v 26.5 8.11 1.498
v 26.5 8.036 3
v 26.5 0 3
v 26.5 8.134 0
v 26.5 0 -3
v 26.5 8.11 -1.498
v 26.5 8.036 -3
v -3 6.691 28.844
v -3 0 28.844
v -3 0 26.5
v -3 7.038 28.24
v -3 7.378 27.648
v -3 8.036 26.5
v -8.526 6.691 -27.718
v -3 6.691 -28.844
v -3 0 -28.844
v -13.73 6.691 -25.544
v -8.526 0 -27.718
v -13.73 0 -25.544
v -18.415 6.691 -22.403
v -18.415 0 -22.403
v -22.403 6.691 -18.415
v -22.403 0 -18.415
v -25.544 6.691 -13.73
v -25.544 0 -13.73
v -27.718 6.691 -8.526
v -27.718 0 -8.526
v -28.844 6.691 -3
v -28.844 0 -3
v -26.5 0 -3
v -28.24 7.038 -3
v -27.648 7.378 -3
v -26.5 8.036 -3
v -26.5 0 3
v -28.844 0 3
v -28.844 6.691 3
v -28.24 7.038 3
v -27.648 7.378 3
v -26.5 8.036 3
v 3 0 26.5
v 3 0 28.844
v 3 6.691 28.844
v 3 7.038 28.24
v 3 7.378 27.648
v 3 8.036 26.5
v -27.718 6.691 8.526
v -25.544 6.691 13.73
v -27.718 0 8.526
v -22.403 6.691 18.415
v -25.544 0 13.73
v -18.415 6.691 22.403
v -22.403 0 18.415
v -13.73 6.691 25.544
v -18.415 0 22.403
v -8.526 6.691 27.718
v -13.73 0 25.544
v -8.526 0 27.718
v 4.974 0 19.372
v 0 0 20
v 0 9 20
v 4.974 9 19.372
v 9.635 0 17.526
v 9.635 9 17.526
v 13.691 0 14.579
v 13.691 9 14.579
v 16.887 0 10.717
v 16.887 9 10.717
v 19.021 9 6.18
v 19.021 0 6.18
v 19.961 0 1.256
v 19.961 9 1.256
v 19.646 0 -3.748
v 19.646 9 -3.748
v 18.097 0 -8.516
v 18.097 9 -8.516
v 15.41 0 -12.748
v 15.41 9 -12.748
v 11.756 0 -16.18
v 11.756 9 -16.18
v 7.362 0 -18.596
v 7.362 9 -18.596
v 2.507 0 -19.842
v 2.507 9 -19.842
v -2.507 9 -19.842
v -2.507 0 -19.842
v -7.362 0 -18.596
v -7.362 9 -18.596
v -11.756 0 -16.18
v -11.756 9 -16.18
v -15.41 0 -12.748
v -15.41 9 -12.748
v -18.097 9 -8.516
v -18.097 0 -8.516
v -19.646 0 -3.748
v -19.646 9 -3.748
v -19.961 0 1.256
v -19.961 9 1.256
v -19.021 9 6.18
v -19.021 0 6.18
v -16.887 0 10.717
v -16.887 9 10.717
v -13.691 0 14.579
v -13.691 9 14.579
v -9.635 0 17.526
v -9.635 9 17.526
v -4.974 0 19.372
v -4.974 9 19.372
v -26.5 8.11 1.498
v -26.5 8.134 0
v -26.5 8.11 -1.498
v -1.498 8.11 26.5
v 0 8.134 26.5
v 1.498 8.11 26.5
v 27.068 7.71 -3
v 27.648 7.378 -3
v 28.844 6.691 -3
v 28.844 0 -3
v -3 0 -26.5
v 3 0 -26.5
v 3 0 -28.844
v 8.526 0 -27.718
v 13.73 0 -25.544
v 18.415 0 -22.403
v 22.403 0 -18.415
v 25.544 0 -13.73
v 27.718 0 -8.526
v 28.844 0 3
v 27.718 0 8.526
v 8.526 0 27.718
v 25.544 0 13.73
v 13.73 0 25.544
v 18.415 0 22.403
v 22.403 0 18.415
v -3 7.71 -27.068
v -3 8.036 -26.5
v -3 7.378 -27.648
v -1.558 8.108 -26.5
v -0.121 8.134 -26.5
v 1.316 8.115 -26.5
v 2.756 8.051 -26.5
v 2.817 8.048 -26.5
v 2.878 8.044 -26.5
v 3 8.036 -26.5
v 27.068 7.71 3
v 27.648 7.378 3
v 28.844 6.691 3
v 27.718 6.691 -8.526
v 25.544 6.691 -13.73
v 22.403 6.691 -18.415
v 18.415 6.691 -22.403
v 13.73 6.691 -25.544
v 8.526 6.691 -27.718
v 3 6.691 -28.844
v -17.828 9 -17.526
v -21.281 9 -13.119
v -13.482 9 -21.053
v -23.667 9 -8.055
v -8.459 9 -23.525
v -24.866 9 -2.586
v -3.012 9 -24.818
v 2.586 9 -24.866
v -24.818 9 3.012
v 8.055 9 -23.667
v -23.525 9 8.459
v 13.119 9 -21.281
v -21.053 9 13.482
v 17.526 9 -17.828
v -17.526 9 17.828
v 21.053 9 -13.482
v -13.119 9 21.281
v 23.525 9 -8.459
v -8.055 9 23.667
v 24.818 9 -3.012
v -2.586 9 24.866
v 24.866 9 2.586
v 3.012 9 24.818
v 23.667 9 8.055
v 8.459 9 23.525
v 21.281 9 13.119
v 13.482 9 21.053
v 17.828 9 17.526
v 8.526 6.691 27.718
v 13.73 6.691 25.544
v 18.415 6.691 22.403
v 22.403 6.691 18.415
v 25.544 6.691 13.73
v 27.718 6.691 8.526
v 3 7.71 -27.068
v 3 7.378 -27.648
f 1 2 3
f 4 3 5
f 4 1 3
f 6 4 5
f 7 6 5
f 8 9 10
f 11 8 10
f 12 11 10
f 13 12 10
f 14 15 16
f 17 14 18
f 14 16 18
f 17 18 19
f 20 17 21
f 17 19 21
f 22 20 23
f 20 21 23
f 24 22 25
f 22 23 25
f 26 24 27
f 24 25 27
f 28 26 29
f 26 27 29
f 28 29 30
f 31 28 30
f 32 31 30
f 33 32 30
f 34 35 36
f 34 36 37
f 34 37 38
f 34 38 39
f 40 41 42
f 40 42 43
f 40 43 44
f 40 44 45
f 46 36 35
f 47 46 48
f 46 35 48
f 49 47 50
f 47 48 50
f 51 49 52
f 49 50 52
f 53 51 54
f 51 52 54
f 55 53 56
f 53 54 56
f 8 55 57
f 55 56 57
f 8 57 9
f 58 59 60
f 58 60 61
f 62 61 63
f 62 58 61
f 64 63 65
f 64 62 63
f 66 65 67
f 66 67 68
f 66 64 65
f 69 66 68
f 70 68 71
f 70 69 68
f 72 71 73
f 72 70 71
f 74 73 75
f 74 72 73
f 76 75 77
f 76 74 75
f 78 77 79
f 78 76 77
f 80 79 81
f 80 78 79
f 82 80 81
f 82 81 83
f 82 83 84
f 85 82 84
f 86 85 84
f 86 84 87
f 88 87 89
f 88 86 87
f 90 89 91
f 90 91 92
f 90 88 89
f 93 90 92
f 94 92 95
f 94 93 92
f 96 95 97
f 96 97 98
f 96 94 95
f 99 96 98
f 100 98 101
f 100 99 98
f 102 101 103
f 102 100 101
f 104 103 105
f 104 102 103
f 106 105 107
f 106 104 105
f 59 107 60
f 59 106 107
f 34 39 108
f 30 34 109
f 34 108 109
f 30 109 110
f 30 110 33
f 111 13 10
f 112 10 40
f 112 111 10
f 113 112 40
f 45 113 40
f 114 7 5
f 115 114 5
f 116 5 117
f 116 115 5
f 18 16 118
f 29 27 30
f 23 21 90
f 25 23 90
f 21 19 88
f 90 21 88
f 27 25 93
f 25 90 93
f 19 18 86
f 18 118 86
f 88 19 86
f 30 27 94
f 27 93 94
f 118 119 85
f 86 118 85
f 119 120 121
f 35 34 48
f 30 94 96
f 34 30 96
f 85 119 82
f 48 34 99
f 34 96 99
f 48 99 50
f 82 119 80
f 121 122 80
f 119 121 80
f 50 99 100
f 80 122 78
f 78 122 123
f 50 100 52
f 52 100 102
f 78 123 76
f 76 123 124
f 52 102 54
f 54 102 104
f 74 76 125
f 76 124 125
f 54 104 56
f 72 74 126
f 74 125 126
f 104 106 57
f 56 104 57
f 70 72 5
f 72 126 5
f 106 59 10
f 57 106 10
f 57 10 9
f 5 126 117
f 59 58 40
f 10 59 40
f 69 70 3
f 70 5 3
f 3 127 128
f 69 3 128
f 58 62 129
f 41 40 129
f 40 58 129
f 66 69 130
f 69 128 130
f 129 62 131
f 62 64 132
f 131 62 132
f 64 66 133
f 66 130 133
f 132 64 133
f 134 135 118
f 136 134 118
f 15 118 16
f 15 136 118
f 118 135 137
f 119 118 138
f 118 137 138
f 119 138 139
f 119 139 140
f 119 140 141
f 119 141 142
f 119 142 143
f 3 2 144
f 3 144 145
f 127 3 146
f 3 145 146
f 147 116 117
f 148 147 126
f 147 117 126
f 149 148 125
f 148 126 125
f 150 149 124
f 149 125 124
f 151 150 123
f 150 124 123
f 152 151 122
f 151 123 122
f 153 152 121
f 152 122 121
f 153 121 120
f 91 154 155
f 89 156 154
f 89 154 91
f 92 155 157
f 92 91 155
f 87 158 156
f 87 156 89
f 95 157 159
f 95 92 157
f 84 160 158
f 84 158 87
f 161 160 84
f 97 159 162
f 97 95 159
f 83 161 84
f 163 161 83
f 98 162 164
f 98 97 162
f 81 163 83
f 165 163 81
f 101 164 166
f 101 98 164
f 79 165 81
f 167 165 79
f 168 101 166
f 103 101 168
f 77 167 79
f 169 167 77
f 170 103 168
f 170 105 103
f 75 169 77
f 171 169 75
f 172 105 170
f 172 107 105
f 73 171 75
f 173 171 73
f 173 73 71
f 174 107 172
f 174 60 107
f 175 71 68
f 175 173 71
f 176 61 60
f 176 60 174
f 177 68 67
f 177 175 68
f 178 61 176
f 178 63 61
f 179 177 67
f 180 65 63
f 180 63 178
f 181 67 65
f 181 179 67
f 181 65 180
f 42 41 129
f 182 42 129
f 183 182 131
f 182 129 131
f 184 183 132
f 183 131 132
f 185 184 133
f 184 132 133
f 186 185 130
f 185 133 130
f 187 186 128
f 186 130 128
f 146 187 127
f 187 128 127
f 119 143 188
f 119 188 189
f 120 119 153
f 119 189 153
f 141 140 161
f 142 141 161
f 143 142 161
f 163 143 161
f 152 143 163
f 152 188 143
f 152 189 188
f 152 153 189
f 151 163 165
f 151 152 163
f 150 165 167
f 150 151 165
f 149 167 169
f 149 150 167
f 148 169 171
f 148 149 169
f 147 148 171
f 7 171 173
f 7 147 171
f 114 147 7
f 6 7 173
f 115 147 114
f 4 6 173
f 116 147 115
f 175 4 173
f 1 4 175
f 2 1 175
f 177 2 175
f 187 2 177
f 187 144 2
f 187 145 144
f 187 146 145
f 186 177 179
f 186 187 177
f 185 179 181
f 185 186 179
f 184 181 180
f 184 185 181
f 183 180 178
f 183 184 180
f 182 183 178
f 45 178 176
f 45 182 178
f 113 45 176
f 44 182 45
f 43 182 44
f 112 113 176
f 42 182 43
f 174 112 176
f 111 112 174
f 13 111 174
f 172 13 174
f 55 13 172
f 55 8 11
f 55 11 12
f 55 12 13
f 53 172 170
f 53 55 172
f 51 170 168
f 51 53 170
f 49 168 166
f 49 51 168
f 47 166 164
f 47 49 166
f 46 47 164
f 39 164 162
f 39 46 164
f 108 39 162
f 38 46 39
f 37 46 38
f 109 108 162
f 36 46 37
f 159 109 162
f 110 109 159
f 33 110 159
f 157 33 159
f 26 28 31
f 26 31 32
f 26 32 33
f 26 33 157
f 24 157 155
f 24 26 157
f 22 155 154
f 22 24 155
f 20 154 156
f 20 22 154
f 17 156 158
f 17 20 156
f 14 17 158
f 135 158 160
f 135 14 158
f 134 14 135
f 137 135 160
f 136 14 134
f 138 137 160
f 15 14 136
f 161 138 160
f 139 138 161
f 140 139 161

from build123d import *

# Parameters (mm, degrees)
CROQUIS1_R              = 29
CROQUIS1_R_2            = 20
SALIENTE_EXTRUIR1_DEPTH = 9
CORTAR_EXTRUIR1_REACH   = 43.988
CROQUIS2_W              = 6
CROQUIS2_H              = 2.5
CROQUIS2_W_2            = 2.5
CROQUIS2_H_2            = 6


with BuildPart() as part:
    # Croquis1 → Saliente-Extruir1 (new body)
    with BuildSketch(Plane(origin=(0, 0, 0), x_dir=(1, 0, 0), z_dir=(0, 1, 0))):
        with Locations(Location((0, 0, 0), (0, 0, 270))):
            Circle(CROQUIS1_R)
        with Locations(Location((0, 0, 0), (0, 0, 270))):
            Circle(CROQUIS1_R_2, mode=Mode.SUBTRACT)
    extrude(amount=SALIENTE_EXTRUIR1_DEPTH)

    # Croquis2 → Cortar-Extruir1 (cut, up to next)
    with BuildSketch(Plane(origin=(0, 9, 0), x_dir=(1, 0, 0), z_dir=(0, 1, 0)), mode=Mode.PRIVATE) as cortar_extruir1_sk1:
        with Locations((0, 27.75)):
            Rectangle(CROQUIS2_W, CROQUIS2_H)
    cortar_extruir1_tool1 = extrude(cortar_extruir1_sk1.sketch, amount=-CORTAR_EXTRUIR1_REACH, mode=Mode.PRIVATE) & part.part
    # Croquis2 → Cortar-Extruir1 (cut, up to next)
    with BuildSketch(Plane(origin=(0, 9, 0), x_dir=(1, 0, 0), z_dir=(0, 1, 0)), mode=Mode.PRIVATE) as cortar_extruir1_sk2:
        with Locations((0, -27.75)):
            Rectangle(CROQUIS2_W, CROQUIS2_H)
    cortar_extruir1_tool2 = extrude(cortar_extruir1_sk2.sketch, amount=-CORTAR_EXTRUIR1_REACH, mode=Mode.PRIVATE) & part.part
    # Croquis2 → Cortar-Extruir1 (cut, up to next)
    with BuildSketch(Plane(origin=(0, 9, 0), x_dir=(1, 0, 0), z_dir=(0, 1, 0)), mode=Mode.PRIVATE) as cortar_extruir1_sk3:
        with Locations((27.75, 0)):
            Rectangle(CROQUIS2_W_2, CROQUIS2_H_2)
    cortar_extruir1_tool3 = extrude(cortar_extruir1_sk3.sketch, amount=-CORTAR_EXTRUIR1_REACH, mode=Mode.PRIVATE) & part.part
    # Croquis2 → Cortar-Extruir1 (cut, up to next)
    with BuildSketch(Plane(origin=(0, 9, 0), x_dir=(1, 0, 0), z_dir=(0, 1, 0)), mode=Mode.PRIVATE) as cortar_extruir1_sk4:
        with Locations((-27.75, 0)):
            Rectangle(CROQUIS2_W_2, CROQUIS2_H_2)
    cortar_extruir1_tool4 = extrude(cortar_extruir1_sk4.sketch, amount=-CORTAR_EXTRUIR1_REACH, mode=Mode.PRIVATE) & part.part
    add(cortar_extruir1_tool1.solids().sort_by_distance((0, 9, -27.75))[0], mode=Mode.SUBTRACT)
    add(cortar_extruir1_tool2.solids().sort_by_distance((0, 9, 27.75))[0], mode=Mode.SUBTRACT)
    add(cortar_extruir1_tool3.solids().sort_by_distance((27.75, 9, 0))[0], mode=Mode.SUBTRACT)
    add(cortar_extruir1_tool4.solids().sort_by_distance((-27.75, 9, 0))[0], mode=Mode.SUBTRACT)

    # Croquis3 → Cortar-Revolución1 (revolve, cut)
    with BuildSketch(Plane(origin=(0, 0, 0), x_dir=(0, 0, -1), z_dir=(1, 0, 0)), mode=Mode.PRIVATE) as cortar_revoluci_n1_sk:
        Polygon((-29, 9), (-25, 9), (-29, 6.690598923), align=None)
    revolve(cortar_revoluci_n1_sk.sketch.rotate(Axis((0, 9, 0), (0, -1, 0)), 185.937772452), axis=Axis((0, 9, 0), (0, -1, 0)), mode=Mode.SUBTRACT)


solid = part.part
